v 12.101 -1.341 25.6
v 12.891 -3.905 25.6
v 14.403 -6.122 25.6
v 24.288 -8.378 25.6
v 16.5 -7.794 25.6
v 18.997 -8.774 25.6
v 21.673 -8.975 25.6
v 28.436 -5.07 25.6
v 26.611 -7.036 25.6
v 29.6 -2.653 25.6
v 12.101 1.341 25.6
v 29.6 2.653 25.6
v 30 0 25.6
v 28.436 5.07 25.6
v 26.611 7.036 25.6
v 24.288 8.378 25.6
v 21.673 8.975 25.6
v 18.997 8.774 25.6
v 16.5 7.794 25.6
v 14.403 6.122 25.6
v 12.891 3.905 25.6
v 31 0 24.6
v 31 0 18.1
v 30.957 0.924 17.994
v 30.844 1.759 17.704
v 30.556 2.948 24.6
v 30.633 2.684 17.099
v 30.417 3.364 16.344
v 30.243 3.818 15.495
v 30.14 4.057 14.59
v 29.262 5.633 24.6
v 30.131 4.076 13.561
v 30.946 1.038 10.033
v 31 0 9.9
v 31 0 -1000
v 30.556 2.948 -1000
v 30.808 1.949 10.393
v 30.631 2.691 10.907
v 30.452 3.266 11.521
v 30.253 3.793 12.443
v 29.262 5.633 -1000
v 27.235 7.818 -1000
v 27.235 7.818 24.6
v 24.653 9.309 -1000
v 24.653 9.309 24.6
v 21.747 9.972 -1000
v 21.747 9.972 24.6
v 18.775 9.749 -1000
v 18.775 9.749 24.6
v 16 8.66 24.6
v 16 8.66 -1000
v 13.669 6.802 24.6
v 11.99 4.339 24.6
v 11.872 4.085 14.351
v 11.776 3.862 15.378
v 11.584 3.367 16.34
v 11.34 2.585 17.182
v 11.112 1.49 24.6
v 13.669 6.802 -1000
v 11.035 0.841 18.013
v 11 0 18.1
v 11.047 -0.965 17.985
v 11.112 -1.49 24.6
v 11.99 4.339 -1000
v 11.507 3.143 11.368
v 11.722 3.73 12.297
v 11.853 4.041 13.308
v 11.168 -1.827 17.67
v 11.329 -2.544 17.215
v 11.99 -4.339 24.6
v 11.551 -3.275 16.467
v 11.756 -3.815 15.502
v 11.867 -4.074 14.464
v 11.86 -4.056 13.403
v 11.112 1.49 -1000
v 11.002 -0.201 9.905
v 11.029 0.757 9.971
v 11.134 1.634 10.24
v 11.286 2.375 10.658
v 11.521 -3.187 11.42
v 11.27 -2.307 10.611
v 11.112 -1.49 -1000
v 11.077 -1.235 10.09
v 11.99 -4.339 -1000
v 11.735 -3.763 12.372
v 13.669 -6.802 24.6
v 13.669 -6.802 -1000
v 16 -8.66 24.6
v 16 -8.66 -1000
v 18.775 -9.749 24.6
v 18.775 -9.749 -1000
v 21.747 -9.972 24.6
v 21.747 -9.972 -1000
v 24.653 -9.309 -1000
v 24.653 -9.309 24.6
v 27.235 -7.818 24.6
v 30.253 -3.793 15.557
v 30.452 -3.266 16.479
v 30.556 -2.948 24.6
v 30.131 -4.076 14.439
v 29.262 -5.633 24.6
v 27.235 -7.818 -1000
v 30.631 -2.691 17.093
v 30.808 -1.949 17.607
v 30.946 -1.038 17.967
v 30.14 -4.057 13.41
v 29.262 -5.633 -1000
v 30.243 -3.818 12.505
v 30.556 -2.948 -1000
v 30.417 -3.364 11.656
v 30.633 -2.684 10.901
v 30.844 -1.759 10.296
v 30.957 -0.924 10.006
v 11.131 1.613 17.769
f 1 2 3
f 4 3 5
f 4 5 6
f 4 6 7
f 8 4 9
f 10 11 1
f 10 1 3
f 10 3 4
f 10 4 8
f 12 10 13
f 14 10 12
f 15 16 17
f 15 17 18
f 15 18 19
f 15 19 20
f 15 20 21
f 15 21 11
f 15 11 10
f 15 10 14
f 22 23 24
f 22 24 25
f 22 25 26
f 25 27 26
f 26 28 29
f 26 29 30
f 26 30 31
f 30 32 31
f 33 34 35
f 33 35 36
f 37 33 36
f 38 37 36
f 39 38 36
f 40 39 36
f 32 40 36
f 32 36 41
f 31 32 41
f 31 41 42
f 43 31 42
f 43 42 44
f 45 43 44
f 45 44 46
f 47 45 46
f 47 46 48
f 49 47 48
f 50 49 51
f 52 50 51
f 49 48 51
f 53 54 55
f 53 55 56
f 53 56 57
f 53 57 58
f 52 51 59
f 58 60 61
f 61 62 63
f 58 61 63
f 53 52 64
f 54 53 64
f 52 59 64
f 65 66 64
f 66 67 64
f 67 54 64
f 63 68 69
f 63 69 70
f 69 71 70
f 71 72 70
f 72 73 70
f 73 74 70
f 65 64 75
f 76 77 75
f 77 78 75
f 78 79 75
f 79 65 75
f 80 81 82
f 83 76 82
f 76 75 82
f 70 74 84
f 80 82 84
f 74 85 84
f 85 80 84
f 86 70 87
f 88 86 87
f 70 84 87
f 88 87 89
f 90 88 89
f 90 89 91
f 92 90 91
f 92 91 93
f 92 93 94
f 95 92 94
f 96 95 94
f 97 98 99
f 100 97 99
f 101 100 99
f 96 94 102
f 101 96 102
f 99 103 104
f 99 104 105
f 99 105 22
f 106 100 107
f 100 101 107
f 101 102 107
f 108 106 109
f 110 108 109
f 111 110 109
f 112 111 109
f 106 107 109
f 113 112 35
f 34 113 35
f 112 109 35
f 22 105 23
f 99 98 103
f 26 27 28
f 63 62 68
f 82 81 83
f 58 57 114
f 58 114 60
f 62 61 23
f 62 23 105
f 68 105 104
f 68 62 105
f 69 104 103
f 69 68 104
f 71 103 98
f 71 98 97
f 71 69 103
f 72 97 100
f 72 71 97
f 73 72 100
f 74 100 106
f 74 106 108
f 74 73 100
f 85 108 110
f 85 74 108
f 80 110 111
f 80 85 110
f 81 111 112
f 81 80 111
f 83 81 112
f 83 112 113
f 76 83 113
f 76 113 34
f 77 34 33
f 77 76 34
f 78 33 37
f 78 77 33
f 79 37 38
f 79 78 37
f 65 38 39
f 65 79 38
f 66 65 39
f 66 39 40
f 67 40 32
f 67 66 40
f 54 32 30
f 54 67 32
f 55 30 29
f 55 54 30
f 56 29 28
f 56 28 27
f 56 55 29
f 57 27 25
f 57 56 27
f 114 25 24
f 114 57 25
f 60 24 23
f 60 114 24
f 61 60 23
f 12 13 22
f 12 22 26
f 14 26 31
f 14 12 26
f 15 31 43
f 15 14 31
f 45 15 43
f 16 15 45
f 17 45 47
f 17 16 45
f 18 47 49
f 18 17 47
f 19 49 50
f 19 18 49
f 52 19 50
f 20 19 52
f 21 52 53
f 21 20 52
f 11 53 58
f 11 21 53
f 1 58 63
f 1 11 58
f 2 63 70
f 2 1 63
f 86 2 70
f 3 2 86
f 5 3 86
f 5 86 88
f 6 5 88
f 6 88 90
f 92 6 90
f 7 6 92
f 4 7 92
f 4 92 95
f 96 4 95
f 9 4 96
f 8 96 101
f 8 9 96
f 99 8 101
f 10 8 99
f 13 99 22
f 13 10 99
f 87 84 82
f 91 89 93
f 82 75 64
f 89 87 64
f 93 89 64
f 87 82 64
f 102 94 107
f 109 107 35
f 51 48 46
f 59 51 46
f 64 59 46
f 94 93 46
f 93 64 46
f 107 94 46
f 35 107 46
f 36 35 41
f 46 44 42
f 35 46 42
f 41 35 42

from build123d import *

# Parameters (mm, degrees)
EXTRUDE_1_DEPTH          = 25.6
EXTRUDE_1_DEPTH_BACK     = 1000
SKETCH_1_R               = 10
CUT_EXTRUDE_1_DEPTH      = 1001.530359359
CUT_EXTRUDE_1_DEPTH_BACK = 1001.530359359
SKETCH_2_R               = 4.1
CHAMFER_1_SIZE           = 1


with BuildPart() as part:
    # Эскиз1 → Бобышка-Вытянуть1 (new, two sides: drawn at the far end of the back side and taken through both)
    with BuildSketch(Plane.XY.offset(-EXTRUDE_1_DEPTH_BACK)):
        with Locations((21, 0)):
            Circle(SKETCH_1_R)
    extrude(amount=EXTRUDE_1_DEPTH + EXTRUDE_1_DEPTH_BACK)

    # Эскиз2 → Вырез-Вытянуть1 (cut, two sides: drawn at the far end of the back side and taken through both)
    with BuildSketch(Plane(origin=(0, 0, 0), x_dir=(0, 0, -1), z_dir=(1, 0, 0)).offset(-CUT_EXTRUDE_1_DEPTH_BACK)):
        with Locations(Location((-14, 0, 0), (0, 0, 180))):
            Circle(SKETCH_2_R)
    extrude(amount=CUT_EXTRUDE_1_DEPTH + CUT_EXTRUDE_1_DEPTH_BACK, mode=Mode.SUBTRACT)

    # Фаска1
    chamfer_1_edges = [part.edges().sort_by_distance(p)[0] for p in [
        (11, 0, 25.6),
    ]]
    chamfer(chamfer_1_edges, length=CHAMFER_1_SIZE)


solid = part.part
